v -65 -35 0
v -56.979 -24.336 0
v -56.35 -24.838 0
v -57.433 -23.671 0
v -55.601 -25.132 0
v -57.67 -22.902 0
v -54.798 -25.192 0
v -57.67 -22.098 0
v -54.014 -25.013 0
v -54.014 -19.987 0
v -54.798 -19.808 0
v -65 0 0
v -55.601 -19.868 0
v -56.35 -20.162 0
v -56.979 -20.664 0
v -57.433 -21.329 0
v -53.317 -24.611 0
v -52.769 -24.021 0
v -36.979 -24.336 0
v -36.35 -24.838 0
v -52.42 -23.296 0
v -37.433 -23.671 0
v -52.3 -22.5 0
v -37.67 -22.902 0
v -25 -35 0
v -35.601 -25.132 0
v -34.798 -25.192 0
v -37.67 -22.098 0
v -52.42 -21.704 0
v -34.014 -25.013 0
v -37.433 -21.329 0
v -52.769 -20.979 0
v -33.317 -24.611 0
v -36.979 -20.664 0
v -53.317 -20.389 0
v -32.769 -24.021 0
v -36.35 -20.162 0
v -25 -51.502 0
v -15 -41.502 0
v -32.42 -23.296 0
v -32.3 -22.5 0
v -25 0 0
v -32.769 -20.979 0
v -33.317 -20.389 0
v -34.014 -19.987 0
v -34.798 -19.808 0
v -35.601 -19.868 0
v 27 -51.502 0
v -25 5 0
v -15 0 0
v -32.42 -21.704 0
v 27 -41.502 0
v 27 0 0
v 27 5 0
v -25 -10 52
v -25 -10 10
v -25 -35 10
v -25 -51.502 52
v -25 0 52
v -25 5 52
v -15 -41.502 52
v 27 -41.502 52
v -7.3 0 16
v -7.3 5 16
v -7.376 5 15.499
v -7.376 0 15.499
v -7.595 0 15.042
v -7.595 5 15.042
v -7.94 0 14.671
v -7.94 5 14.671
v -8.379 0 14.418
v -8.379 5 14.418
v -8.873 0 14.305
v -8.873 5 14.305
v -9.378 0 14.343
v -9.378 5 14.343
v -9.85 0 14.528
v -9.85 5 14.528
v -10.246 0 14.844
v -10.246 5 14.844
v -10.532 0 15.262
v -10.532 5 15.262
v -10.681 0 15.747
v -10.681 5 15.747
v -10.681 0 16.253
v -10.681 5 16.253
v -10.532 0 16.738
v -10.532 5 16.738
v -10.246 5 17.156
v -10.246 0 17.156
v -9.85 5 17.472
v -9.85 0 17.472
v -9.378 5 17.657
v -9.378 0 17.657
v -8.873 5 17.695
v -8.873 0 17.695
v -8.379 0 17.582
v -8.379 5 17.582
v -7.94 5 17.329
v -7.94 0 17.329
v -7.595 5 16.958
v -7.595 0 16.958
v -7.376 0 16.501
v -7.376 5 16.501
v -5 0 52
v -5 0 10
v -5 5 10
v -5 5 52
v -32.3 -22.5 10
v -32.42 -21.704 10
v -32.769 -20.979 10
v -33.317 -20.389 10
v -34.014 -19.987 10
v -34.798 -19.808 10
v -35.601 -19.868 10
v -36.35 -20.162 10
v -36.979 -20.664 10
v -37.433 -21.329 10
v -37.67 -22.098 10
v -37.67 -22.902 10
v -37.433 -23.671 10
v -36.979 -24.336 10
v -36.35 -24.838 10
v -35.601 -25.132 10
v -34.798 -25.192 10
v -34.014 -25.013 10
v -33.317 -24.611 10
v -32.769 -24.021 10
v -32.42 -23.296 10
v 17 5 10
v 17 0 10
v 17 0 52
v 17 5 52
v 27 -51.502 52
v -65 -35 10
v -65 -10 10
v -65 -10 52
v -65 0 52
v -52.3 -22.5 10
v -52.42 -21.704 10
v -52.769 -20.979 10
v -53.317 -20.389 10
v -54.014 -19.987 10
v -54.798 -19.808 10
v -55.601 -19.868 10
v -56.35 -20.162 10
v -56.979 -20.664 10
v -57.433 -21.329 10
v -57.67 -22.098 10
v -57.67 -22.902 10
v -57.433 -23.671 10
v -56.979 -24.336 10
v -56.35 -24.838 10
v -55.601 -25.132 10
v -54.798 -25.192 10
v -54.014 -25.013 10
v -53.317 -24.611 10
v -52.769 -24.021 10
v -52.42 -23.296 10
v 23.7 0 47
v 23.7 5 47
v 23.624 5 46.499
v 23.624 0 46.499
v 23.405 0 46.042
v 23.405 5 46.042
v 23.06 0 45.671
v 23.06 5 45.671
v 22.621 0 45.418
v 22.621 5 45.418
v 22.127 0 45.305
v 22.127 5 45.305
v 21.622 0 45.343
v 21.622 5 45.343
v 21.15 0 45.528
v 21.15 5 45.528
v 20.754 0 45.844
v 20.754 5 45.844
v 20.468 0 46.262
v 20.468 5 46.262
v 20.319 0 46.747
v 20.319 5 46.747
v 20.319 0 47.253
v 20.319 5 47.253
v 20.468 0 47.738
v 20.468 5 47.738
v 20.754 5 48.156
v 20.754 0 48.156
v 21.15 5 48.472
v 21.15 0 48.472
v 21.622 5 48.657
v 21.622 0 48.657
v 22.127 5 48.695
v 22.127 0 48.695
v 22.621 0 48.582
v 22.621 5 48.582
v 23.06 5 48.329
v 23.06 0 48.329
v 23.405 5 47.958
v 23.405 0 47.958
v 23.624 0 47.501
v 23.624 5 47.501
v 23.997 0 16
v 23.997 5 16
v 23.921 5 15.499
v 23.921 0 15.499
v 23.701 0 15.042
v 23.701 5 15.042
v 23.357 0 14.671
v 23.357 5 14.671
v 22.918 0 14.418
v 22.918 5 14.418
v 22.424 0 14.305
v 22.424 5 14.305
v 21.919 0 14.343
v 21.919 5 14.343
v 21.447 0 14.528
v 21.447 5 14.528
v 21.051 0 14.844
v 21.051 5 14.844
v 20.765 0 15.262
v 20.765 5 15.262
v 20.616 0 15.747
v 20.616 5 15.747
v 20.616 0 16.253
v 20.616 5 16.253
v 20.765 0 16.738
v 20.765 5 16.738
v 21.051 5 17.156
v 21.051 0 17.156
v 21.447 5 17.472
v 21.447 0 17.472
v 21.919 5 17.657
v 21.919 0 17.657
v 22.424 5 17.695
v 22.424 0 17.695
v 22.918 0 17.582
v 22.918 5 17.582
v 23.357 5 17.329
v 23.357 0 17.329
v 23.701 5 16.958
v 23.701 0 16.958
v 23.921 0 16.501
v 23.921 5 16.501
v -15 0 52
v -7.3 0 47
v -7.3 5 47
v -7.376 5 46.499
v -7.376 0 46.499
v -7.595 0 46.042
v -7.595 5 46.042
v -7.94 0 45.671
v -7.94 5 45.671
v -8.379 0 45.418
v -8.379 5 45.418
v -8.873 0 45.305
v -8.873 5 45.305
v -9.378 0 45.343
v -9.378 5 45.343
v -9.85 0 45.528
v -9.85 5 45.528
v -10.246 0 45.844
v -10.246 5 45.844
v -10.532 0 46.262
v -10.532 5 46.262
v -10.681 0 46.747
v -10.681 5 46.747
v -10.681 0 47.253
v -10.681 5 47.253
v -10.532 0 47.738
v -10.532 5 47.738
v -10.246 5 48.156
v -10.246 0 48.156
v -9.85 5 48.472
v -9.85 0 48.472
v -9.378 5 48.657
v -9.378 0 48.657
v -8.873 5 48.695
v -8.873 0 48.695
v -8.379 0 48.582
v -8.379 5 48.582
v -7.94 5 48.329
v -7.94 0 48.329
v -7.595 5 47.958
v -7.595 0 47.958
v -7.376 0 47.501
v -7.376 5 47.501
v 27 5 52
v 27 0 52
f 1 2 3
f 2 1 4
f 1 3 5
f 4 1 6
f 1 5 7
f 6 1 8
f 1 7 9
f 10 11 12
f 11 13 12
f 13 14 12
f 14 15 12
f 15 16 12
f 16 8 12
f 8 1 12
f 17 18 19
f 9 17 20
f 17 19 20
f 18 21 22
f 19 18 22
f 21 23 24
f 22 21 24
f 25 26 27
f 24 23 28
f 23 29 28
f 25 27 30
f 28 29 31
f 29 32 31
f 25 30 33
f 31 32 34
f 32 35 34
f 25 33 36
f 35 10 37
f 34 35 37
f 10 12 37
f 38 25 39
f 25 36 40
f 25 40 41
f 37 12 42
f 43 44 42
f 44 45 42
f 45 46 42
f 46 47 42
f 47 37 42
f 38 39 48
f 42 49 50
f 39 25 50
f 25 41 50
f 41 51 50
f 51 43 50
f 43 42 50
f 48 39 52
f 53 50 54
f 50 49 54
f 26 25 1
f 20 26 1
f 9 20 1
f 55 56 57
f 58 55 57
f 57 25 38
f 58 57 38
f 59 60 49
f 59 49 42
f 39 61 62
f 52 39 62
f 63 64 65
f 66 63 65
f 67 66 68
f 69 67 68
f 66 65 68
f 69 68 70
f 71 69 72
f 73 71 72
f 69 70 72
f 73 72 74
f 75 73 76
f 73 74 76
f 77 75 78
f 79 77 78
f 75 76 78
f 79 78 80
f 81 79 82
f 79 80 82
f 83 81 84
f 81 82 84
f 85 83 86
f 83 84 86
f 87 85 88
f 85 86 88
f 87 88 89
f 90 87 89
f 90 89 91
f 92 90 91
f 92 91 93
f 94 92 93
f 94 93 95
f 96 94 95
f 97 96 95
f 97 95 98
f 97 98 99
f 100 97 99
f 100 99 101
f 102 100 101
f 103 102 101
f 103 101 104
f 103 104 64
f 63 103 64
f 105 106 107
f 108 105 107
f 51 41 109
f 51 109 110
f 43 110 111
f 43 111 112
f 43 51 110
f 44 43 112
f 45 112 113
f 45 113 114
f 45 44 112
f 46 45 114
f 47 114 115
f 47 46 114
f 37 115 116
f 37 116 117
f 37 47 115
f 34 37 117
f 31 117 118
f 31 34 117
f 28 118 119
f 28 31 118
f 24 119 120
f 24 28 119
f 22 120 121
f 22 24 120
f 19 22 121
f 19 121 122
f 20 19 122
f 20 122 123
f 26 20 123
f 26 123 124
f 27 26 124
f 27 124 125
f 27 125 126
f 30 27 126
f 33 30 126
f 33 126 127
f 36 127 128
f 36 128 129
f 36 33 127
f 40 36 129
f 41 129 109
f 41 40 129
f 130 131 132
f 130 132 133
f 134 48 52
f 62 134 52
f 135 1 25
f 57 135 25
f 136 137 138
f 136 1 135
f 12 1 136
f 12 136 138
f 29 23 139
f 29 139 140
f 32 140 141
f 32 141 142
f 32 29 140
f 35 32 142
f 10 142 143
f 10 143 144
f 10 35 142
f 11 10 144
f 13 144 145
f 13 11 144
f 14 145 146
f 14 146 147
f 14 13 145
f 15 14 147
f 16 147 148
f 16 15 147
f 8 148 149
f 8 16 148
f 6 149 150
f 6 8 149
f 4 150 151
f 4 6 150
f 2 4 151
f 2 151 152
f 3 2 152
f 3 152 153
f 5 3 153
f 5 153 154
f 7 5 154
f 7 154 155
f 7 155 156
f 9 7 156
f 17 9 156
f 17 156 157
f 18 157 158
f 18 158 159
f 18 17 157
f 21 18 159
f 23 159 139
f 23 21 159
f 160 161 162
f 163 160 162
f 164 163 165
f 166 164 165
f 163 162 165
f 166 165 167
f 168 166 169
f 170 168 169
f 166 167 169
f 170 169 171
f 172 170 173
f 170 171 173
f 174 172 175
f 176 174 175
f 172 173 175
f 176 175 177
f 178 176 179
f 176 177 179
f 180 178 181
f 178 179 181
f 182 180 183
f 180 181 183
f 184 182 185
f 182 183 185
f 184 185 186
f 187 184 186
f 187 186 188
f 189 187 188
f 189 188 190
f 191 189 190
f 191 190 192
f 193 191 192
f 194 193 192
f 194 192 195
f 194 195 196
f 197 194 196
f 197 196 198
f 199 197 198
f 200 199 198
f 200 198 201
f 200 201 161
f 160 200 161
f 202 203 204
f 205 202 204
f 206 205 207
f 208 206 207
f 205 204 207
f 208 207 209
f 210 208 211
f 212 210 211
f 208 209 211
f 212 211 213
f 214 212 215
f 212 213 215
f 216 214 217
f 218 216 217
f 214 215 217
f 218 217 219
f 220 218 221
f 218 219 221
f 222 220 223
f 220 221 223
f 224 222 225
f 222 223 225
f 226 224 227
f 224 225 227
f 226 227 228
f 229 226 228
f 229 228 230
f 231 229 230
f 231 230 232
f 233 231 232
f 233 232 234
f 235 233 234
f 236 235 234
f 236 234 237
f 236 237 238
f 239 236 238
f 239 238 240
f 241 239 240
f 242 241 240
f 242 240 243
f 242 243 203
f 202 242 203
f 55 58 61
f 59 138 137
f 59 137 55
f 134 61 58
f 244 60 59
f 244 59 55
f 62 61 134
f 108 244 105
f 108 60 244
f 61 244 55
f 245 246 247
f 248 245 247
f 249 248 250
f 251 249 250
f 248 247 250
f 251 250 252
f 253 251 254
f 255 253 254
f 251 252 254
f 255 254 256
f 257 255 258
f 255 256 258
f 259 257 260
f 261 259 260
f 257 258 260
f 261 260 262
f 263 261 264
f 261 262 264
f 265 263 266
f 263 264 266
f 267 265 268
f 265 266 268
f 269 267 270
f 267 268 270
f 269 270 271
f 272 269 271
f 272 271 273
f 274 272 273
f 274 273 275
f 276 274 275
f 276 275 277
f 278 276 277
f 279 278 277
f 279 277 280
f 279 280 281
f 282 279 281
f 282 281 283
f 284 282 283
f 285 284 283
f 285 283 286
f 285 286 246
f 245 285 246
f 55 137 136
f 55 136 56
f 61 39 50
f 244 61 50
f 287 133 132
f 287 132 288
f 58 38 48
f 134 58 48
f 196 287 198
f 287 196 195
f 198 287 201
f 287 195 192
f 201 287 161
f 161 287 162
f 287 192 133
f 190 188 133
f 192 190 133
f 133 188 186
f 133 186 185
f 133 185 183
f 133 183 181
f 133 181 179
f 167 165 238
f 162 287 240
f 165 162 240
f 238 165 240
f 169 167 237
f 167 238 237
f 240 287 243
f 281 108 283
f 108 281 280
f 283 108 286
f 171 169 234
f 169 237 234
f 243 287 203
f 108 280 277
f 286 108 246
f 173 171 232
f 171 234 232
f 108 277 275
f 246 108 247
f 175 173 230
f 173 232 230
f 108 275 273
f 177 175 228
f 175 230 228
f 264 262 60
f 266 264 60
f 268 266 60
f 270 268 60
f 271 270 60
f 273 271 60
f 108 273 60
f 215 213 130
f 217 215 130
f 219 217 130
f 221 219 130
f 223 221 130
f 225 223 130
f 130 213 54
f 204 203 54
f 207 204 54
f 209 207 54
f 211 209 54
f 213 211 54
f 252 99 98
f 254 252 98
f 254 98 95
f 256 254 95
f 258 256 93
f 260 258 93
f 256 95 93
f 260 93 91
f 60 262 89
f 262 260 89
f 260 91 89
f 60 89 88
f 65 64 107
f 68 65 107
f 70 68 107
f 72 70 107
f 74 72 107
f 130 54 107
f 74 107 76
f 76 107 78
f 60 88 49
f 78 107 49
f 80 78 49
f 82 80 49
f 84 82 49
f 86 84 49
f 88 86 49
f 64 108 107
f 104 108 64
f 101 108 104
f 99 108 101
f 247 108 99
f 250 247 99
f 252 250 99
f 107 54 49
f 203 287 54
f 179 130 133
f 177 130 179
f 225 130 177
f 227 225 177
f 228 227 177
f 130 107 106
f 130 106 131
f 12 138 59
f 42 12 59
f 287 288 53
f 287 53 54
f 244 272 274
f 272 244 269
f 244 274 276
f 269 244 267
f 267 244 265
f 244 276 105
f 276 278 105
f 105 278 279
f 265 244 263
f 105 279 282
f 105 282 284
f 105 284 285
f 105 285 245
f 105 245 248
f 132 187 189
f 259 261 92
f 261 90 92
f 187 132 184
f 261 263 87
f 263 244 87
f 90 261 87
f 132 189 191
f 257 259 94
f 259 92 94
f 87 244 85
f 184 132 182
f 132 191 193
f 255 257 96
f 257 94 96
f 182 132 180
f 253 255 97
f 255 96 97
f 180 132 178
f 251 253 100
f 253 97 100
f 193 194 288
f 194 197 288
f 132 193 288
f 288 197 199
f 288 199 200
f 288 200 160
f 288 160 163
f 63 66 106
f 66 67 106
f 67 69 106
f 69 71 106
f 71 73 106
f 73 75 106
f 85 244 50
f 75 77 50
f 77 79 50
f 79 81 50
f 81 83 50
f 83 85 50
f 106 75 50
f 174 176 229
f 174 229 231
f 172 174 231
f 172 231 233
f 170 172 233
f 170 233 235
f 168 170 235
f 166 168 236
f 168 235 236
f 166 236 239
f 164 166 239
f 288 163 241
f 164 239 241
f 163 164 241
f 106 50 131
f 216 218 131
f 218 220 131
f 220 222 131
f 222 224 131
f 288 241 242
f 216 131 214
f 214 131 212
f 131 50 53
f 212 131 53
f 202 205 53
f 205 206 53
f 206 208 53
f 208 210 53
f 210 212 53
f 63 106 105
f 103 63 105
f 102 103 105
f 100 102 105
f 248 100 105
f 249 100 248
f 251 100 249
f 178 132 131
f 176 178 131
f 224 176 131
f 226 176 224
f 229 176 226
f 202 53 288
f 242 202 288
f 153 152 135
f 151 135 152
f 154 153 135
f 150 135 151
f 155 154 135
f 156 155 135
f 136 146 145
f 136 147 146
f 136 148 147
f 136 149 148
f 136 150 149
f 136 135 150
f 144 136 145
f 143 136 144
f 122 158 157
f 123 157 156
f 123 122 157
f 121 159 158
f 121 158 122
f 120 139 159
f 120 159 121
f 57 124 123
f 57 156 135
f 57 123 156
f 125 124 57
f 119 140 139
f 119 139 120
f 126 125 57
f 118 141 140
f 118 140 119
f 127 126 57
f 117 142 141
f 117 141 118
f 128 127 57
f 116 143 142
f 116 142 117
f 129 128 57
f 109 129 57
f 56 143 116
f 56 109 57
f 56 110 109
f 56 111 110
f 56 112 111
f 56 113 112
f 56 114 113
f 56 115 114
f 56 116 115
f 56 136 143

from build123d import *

# Parameters (mm, degrees)
SKETCH7_W             = 40
SKETCH7_H             = 25
SKETCH7_R             = 2.7
BOSS_EXTRUDE5_DEPTH   = 10
SKETCH7_W_2           = 22
SKETCH7_H_2           = 5
BOSS_EXTRUDE5_2_DEPTH = 10
SKETCH7_4_W           = 10
SKETCH7_4_H           = 5
BOSS_EXTRUDE6_DEPTH   = 52
CUT_EXTRUDE3_REACH    = 102.605
SKETCH8_R             = 1.7


with BuildPart() as part:
    # Sketch7 → Boss-Extrude5 (new body)
    with BuildSketch(Plane.XY):
        with Locations((-45, -22.5)):
            Rectangle(SKETCH7_W, SKETCH7_H)
        with Locations((-55, -22.5)):
            Circle(SKETCH7_R, mode=Mode.SUBTRACT)
        with Locations((-35, -22.5)):
            Circle(SKETCH7_R, mode=Mode.SUBTRACT)
    extrude(amount=BOSS_EXTRUDE5_DEPTH)



with BuildPart() as body_2:
    # Sketch7 → Boss-Extrude5 2 (new body)
    with BuildSketch(Plane.XY):
        with Locations((6, 2.5)):
            Rectangle(SKETCH7_W_2, SKETCH7_H_2)
    extrude(amount=BOSS_EXTRUDE5_2_DEPTH)


with BuildPart() as part_1:
    add(part.part)

    add(body_2.part)  # Boss-Extrude6 merges body 2
    # Sketch7<4> → Boss-Extrude6 (add)
    with BuildSketch(Plane.XY):
        Polygon((-15, -41.501763528), (-15, 0), (-5, 0), (-5, 5), (-25, 5), (-25, 0), (-65, 0), (-65, -10), (-25, -10), (-25, -51.501763528), (27, -51.501763528), (27, -41.501763528), align=None)
        with Locations((22, 2.5)):
            Rectangle(SKETCH7_4_W, SKETCH7_4_H)
    extrude(amount=BOSS_EXTRUDE6_DEPTH)

    # Sketch8 → Cut-Extrude3 (cut, up to next)
    with BuildSketch(Plane(origin=(0, 5, 0), x_dir=(1, 0, 0), z_dir=(0, 1, 0)), mode=Mode.PRIVATE) as cut_extrude3_sk1:
        with Locations((22, -47)):
            Circle(SKETCH8_R)
    cut_extrude3_tool1 = extrude(cut_extrude3_sk1.sketch, amount=-CUT_EXTRUDE3_REACH, mode=Mode.PRIVATE) & part_1.part
    # Sketch8 → Cut-Extrude3 (cut, up to next)
    with BuildSketch(Plane(origin=(0, 5, 0), x_dir=(1, 0, 0), z_dir=(0, 1, 0)), mode=Mode.PRIVATE) as cut_extrude3_sk2:
        with Locations((22.296850592, -16)):
            Circle(SKETCH8_R)
    cut_extrude3_tool2 = extrude(cut_extrude3_sk2.sketch, amount=-CUT_EXTRUDE3_REACH, mode=Mode.PRIVATE) & part_1.part
    # Sketch8 → Cut-Extrude3 (cut, up to next)
    with BuildSketch(Plane(origin=(0, 5, 0), x_dir=(1, 0, 0), z_dir=(0, 1, 0)), mode=Mode.PRIVATE) as cut_extrude3_sk3:
        with Locations((-9, -47)):
            Circle(SKETCH8_R)
    cut_extrude3_tool3 = extrude(cut_extrude3_sk3.sketch, amount=-CUT_EXTRUDE3_REACH, mode=Mode.PRIVATE) & part_1.part
    # Sketch8 → Cut-Extrude3 (cut, up to next)
    with BuildSketch(Plane(origin=(0, 5, 0), x_dir=(1, 0, 0), z_dir=(0, 1, 0)), mode=Mode.PRIVATE) as cut_extrude3_sk4:
        with Locations((-9, -16)):
            Circle(SKETCH8_R)
    cut_extrude3_tool4 = extrude(cut_extrude3_sk4.sketch, amount=-CUT_EXTRUDE3_REACH, mode=Mode.PRIVATE) & part_1.part
    add(cut_extrude3_tool1.solids().sort_by_distance((22, 5, 47))[0], mode=Mode.SUBTRACT)
    add(cut_extrude3_tool2.solids().sort_by_distance((22.296851, 5, 16))[0], mode=Mode.SUBTRACT)
    add(cut_extrude3_tool3.solids().sort_by_distance((-9, 5, 47))[0], mode=Mode.SUBTRACT)
    add(cut_extrude3_tool4.solids().sort_by_distance((-9, 5, 16))[0], mode=Mode.SUBTRACT)


solid = part_1.part
